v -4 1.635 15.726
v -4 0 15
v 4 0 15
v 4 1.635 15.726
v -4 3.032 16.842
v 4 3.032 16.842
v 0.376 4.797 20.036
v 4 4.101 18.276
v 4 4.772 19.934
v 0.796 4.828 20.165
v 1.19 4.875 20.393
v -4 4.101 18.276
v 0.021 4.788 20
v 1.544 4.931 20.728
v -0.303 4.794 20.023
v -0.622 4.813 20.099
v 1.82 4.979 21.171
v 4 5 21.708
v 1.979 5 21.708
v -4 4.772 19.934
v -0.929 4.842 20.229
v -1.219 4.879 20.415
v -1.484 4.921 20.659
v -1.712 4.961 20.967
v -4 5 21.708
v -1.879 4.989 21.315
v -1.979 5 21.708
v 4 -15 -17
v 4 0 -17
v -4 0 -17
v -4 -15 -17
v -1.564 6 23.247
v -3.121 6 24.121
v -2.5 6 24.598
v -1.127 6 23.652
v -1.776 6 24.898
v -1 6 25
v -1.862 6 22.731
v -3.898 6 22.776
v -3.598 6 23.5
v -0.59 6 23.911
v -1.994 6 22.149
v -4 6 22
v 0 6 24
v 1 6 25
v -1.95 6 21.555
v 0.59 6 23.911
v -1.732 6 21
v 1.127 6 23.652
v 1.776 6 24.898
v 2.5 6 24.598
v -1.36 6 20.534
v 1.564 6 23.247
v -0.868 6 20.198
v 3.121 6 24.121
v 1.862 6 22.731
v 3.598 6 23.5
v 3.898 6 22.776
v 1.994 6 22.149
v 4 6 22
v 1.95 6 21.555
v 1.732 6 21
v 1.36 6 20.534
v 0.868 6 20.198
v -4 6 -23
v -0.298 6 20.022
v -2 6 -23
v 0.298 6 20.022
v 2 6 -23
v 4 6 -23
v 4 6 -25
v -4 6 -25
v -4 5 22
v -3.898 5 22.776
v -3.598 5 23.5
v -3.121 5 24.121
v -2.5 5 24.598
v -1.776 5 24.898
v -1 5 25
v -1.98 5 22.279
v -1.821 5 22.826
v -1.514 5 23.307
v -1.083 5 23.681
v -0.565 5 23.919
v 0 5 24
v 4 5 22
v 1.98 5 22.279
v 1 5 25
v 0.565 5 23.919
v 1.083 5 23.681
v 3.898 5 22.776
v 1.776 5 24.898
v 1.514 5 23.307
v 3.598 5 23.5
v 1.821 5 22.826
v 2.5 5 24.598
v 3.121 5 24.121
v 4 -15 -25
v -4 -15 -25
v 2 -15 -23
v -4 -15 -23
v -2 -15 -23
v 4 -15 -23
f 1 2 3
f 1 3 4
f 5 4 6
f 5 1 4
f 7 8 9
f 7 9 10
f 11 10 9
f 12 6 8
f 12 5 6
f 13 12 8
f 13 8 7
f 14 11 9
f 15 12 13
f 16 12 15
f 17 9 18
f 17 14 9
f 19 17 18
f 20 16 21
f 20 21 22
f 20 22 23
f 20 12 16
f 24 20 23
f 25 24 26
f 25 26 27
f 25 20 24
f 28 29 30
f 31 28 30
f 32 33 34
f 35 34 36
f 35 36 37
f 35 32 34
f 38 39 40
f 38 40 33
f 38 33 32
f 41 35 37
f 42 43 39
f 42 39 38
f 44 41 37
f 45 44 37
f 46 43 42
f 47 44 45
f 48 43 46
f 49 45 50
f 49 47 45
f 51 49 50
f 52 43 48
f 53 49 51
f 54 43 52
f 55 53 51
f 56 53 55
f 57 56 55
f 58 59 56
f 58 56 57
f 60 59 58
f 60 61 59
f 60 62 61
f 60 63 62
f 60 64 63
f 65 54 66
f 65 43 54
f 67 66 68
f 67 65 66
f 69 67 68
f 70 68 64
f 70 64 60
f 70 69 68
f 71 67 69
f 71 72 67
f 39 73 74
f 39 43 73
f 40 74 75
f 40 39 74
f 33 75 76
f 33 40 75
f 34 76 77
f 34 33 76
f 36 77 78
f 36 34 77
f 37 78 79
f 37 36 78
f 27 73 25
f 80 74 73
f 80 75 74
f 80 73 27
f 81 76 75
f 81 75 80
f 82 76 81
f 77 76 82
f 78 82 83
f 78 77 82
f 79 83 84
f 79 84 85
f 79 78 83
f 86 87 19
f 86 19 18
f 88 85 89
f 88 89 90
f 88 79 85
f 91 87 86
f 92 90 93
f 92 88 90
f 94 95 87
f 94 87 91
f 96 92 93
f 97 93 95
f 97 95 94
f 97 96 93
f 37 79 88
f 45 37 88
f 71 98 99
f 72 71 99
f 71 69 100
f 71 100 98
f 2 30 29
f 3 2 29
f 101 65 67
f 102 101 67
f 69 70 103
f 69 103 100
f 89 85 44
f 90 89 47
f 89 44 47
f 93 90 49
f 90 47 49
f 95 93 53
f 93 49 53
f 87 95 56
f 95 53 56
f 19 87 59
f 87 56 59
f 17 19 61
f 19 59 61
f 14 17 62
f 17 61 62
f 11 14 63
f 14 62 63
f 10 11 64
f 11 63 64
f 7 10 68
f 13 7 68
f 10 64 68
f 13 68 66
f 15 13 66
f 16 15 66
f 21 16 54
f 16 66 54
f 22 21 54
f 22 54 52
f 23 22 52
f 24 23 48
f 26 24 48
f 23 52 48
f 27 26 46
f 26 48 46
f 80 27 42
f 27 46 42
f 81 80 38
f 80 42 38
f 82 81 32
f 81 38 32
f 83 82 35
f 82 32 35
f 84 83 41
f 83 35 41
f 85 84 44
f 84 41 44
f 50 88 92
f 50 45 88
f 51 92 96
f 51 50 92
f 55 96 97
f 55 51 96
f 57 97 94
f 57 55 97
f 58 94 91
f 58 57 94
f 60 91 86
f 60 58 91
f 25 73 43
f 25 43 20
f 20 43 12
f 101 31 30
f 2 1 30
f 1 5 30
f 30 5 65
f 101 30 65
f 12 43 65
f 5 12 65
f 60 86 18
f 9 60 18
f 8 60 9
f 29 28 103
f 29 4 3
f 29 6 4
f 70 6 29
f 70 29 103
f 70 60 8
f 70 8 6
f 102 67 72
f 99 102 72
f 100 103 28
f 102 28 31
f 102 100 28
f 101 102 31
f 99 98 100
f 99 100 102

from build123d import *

# Parameters (mm, degrees)
SKETCH1_W                      = 8
SKETCH1_H                      = 50
BOSS_EXTRUDE1_DEPTH            = 6
SKETCH2_W                      = 8
SKETCH2_H                      = 10
CUT_EXTRUDE2_DEPTH             = 5
CUT_EXTRUDE3_REACH             = 28.019
SKETCH3_R                      = 2
FILLET1_R                      = 3
FILLET2_R                      = 7
SKETCH4_W                      = 8
SKETCH4_H                      = 8
BOSS_EXTRUDE2_DEPTH            = 15
CUT_EXTRUDE4_REACH             = 34.894
CUT_EXTRUDE4_DIRECTION_2_DEPTH = 33.893768419


with BuildPart() as part:
    # Sketch1 → Boss-Extrude1 (new body)
    with BuildSketch(Plane(origin=(0, 0, 0), x_dir=(1, 0, 0), z_dir=(0, 1, 0))):
        Rectangle(SKETCH1_W, SKETCH1_H)
    extrude(amount=BOSS_EXTRUDE1_DEPTH)

    # Sketch2 → Cut-Extrude2 (cut)
    with BuildSketch(Plane.XZ):
        with Locations((0, 20)):
            Rectangle(SKETCH2_W, SKETCH2_H)
    extrude(amount=-CUT_EXTRUDE2_DEPTH, mode=Mode.SUBTRACT)

    # Sketch3 → Cut-Extrude3 (cut, up to next)
    with BuildSketch(Plane(origin=(0, 6, 0), x_dir=(1, 0, 0), z_dir=(0, 1, 0)), mode=Mode.PRIVATE) as cut_extrude3_sk1:
        with Locations(Location((0, -22, 0), (0, 0, 270))):
            Circle(SKETCH3_R)
    cut_extrude3_tool1 = extrude(cut_extrude3_sk1.sketch, amount=-CUT_EXTRUDE3_REACH, mode=Mode.PRIVATE) & part.part
    add(cut_extrude3_tool1.solids().sort_by_distance((0, 6, 22))[0], mode=Mode.SUBTRACT)

    # Fillet1
    fillet1_edges = [part.edges().sort_by_distance(p)[0] for p in [
        (4, 5.5, 25),
        (-4, 5.5, 25),
    ]]
    fillet(fillet1_edges, radius=FILLET1_R)

    # Fillet2
    # the kernel refuses this fillet: 7 mm, written as the material it adds along each edge
    with BuildSketch(Plane(origin=(-4, 5, 15), x_dir=(0, 0, 1), z_dir=(1, 0, 0))) as fillet2_piece_1_section:
        with BuildLine():
            CenterArc((6.708203932, 7), FILLET2_R, 196.601549599, 73.398450401)
            Line((0, 5), (0, 0))
            Line((0, 0), (6.708203932, 0))
        make_face()
    fillet2_piece_1 = extrude(amount=8, mode=Mode.PRIVATE)
    fillet2_piece_1 = fillet2_piece_1 - Plane(origin=(0, 5, 22), x_dir=(0, 0, 1), z_dir=(0, 1, 0)) * Cylinder(2, 43, mode=Mode.PRIVATE)
    add(fillet2_piece_1)

    # Sketch4 → Boss-Extrude2 (add)
    with BuildSketch(Plane(origin=(0, 0, 0), x_dir=(-1, 0, 0), z_dir=(0, -1, 0))):
        with Locations((0, 21)):
            Rectangle(SKETCH4_W, SKETCH4_H)
    extrude(amount=BOSS_EXTRUDE2_DEPTH)

    # Sketch5 → Cut-Extrude4 (cut, up to next)
    with BuildSketch(Plane(origin=(0, 6, 0), x_dir=(1, 0, 0), z_dir=(0, 1, 0)), mode=Mode.PRIVATE) as cut_extrude4_sk1:
        Polygon((4, 25), (4, 23), (2, 23), align=None)
    cut_extrude4_tool1 = extrude(cut_extrude4_sk1.sketch, amount=-CUT_EXTRUDE4_REACH, mode=Mode.PRIVATE) & part.part
    # Sketch5 → Cut-Extrude4 (cut, up to next)
    with BuildSketch(Plane(origin=(0, 6, 0), x_dir=(1, 0, 0), z_dir=(0, 1, 0)), mode=Mode.PRIVATE) as cut_extrude4_sk2:
        Polygon((-4, 25), (-4, 23), (-2, 23), align=None)
    cut_extrude4_tool2 = extrude(cut_extrude4_sk2.sketch, amount=-CUT_EXTRUDE4_REACH, mode=Mode.PRIVATE) & part.part
    add(cut_extrude4_tool1.solids().sort_by_distance((3.333333, 6, -23.666667))[0], mode=Mode.SUBTRACT)
    add(cut_extrude4_tool2.solids().sort_by_distance((-3.333333, 6, -23.666667))[0], mode=Mode.SUBTRACT)

    # Sketch5 → Cut-Extrude4 direction 2 (cut)
    with BuildSketch(Plane(origin=(0, 6, 0), x_dir=(1, 0, 0), z_dir=(0, 1, 0))):
        Polygon((4, 25), (4, 23), (2, 23), align=None)
        Polygon((-4, 25), (-4, 23), (-2, 23), align=None)
    extrude(amount=CUT_EXTRUDE4_DIRECTION_2_DEPTH, mode=Mode.SUBTRACT)


solid = part.part
